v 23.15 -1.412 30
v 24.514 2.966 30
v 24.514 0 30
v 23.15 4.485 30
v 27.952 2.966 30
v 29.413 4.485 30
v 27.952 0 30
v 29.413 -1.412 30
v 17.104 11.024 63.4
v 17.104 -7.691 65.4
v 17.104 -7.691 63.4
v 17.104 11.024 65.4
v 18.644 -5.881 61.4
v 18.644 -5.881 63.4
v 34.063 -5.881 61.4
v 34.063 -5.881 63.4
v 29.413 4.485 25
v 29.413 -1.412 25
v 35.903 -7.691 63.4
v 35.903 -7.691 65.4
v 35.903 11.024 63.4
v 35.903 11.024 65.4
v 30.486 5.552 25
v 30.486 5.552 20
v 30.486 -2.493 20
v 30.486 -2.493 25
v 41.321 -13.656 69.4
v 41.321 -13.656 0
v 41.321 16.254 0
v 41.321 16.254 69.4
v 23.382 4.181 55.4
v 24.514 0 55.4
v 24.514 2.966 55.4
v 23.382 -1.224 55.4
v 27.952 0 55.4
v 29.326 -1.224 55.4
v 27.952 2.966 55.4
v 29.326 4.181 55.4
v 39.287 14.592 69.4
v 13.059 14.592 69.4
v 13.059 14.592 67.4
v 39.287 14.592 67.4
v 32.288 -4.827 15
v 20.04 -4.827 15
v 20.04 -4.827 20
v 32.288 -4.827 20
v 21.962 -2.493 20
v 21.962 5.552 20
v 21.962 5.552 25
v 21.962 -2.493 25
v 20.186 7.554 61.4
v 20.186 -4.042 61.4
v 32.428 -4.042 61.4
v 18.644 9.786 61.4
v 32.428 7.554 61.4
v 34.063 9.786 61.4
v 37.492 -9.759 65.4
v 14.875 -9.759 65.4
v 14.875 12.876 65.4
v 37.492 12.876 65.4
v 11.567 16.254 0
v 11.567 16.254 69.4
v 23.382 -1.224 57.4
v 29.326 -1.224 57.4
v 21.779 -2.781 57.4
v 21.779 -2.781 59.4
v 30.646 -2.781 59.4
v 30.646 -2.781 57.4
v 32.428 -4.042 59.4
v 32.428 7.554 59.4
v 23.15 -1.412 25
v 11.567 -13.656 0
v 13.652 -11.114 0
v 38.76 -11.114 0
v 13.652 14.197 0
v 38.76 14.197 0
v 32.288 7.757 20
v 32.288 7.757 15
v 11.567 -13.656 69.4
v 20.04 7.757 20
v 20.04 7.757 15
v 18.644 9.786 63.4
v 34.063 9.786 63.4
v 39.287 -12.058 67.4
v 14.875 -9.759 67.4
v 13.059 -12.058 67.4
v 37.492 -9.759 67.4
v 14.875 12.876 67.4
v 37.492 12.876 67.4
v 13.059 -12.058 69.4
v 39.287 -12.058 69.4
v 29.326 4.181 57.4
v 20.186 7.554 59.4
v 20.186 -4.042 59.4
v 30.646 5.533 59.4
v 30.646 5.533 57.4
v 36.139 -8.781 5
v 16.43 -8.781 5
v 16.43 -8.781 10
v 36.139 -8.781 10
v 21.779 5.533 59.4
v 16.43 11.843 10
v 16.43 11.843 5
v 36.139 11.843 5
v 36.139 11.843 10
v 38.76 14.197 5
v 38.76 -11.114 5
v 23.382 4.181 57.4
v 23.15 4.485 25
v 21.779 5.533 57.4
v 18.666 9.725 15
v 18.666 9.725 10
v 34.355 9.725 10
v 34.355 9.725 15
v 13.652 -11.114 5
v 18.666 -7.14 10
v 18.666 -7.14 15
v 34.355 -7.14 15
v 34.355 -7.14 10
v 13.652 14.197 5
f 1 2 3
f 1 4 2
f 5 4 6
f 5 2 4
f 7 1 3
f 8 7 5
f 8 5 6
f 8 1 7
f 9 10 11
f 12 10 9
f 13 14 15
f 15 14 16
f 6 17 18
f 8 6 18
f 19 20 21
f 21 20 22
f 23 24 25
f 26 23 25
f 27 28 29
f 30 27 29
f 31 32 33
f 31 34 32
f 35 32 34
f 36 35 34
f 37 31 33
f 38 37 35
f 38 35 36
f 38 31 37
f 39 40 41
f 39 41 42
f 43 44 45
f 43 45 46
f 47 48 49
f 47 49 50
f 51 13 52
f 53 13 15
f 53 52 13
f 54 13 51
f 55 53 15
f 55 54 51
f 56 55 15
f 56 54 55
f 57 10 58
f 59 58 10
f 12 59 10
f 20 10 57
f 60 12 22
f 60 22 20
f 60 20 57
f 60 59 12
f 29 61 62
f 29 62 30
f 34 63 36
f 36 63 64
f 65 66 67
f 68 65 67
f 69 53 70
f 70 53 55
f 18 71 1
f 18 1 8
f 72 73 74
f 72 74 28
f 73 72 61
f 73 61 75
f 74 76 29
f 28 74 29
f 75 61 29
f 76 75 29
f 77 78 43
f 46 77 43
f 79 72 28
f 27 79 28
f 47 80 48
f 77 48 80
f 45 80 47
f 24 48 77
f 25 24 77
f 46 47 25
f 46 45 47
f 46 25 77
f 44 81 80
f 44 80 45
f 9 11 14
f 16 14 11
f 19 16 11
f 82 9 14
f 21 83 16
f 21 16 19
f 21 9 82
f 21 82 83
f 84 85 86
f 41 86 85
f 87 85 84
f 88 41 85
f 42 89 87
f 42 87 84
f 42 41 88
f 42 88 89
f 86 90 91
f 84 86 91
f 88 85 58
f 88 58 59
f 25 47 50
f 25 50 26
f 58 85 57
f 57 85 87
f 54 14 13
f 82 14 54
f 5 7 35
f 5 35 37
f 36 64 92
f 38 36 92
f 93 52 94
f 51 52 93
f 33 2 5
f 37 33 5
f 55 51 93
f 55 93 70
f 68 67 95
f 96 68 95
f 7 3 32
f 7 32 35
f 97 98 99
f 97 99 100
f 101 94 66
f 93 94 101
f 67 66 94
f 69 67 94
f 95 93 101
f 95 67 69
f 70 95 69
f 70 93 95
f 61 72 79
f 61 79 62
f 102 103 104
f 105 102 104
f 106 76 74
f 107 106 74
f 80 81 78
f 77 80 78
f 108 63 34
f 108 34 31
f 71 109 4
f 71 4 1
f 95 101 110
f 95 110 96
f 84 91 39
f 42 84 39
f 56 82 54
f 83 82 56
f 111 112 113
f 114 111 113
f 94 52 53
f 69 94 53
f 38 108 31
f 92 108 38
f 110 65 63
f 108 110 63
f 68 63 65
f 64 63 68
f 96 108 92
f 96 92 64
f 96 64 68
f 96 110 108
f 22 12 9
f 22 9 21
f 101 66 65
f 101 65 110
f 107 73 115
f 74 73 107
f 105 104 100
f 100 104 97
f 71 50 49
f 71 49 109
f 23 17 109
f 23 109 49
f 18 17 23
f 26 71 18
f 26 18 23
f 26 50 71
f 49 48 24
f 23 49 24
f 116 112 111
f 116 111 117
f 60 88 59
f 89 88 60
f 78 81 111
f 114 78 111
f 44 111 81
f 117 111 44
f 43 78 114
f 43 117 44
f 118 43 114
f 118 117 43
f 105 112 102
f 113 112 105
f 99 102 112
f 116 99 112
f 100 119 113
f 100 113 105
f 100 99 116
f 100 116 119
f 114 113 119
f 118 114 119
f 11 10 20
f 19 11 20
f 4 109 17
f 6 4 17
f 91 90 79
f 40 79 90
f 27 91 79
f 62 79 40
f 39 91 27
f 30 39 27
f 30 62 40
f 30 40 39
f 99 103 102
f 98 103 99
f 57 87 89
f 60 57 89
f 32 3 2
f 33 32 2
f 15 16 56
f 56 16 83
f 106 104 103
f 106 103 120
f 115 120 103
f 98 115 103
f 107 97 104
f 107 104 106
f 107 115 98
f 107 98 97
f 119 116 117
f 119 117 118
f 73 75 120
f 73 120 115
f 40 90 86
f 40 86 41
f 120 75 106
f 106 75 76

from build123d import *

# Parameters (mm, degrees)
F0_W      = 29.753645
F0_H      = 29.910467
F1_DEPTH  = 69.4
F2_W      = 26.227938
F2_H      = 26.650196
F3_DEPTH  = 2
F4_W      = 22.616781
F4_H      = 22.63493
F5_DEPTH  = 2
F6_W      = 18.798804
F6_H      = 18.714747
F7_DEPTH  = 2
F8_W      = 15.419276
F8_H      = 15.666918
F9_DEPTH  = 2
F10_W     = 12.241865
F10_H     = 11.595491
F11_DEPTH = 2
F12_W     = 8.867356
F12_H     = 8.313611
F13_DEPTH = 2
F14_W     = 5.944216
F14_H     = 5.405146
F15_DEPTH = 2
F16_W     = 3.43767
F16_H     = 2.966377
F17_DEPTH = 55.401
F18_W     = 25.107885
F18_H     = 25.31029
F19_DEPTH = 5
F20_W     = 19.709587
F20_H     = 20.623714
F21_DEPTH = 5
F22_W     = 15.688963
F22_H     = 16.865403
F23_DEPTH = 5
F24_W     = 12.248309
F24_H     = 12.584658
F25_DEPTH = 5
F26_W     = 8.523883
F26_H     = 8.044946
F27_DEPTH = 5
F28_W     = 6.262533
F28_H     = 5.897496
F29_DEPTH = 5


with BuildPart() as f1:
    # F0 (on Top) → F1 (new body)
    with BuildSketch(Plane.XY):
        with Locations((26.444191, 1.299118)):
            Rectangle(F0_W, F0_H)
    extrude(amount=F1_DEPTH)

    # F2 (on face) → F3 (cut)
    with BuildSketch(Plane.XY.offset(69.4)):
        with Locations((26.172734, 1.267092)):
            Rectangle(F2_W, F2_H)
    extrude(amount=-F3_DEPTH, mode=Mode.SUBTRACT)

    # F4 (on face) → F5 (cut)
    with BuildSketch(Plane.XY.offset(67.4)):
        with Locations((26.183258, 1.558795)):
            Rectangle(F4_W, F4_H)
    extrude(amount=-F5_DEPTH, mode=Mode.SUBTRACT)

    # F6 (on face) → F7 (cut)
    with BuildSketch(Plane.XY.offset(65.4)):
        with Locations((26.503739, 1.66645)):
            Rectangle(F6_W, F6_H)
    extrude(amount=-F7_DEPTH, mode=Mode.SUBTRACT)

    # F8 (on face) → F9 (cut)
    with BuildSketch(Plane.XY.offset(63.4)):
        with Locations((26.353671, 1.952434)):
            Rectangle(F8_W, F8_H)
    extrude(amount=-F9_DEPTH, mode=Mode.SUBTRACT)

    # F10 (on face) → F11 (cut)
    with BuildSketch(Plane.XY.offset(61.4)):
        with Locations((26.306717, 1.756216)):
            Rectangle(F10_W, F10_H)
    extrude(amount=-F11_DEPTH, mode=Mode.SUBTRACT)

    # F12 (on face) → F13 (cut)
    with BuildSketch(Plane.XY.offset(59.4)):
        with Locations((26.212682, 1.37607)):
            Rectangle(F12_W, F12_H)
    extrude(amount=-F13_DEPTH, mode=Mode.SUBTRACT)

    # F14 (on face) → F15 (cut)
    with BuildSketch(Plane.XY.offset(57.4)):
        with Locations((26.353785, 1.47873)):
            Rectangle(F14_W, F14_H)
    extrude(amount=-F15_DEPTH, mode=Mode.SUBTRACT)

    # F16 (on face) → F17 (cut, through all)
    with BuildSketch(Plane.XY.offset(55.4)):
        with Locations((26.232888, 1.483189)):
            Rectangle(F16_W, F16_H)
    extrude(amount=-F17_DEPTH, mode=Mode.SUBTRACT)

    # F18 (on face) → F19 (cut)
    with BuildSketch(Plane(origin=(0, 0, 0), x_dir=(1, 0, 0), z_dir=(0, 0, -1))):
        with Locations((26.205565, -1.541603)):
            Rectangle(F18_W, F18_H)
    extrude(amount=-F19_DEPTH, mode=Mode.SUBTRACT)

    # F20 (on face) → F21 (cut)
    with BuildSketch(Plane(origin=(0, 0, 5), x_dir=(1, 0, 0), z_dir=(0, 0, -1))):
        with Locations((26.284554, -1.530935)):
            Rectangle(F20_W, F20_H)
    extrude(amount=-F21_DEPTH, mode=Mode.SUBTRACT)

    # F22 (on face) → F23 (cut)
    with BuildSketch(Plane(origin=(0, 0, 10), x_dir=(1, 0, 0), z_dir=(0, 0, -1))):
        with Locations((26.510216, -1.292301)):
            Rectangle(F22_W, F22_H)
    extrude(amount=-F23_DEPTH, mode=Mode.SUBTRACT)

    # F24 (on face) → F25 (cut)
    with BuildSketch(Plane(origin=(0, 0, 15), x_dir=(1, 0, 0), z_dir=(0, 0, -1))):
        with Locations((26.16421, -1.464862)):
            Rectangle(F24_W, F24_H)
    extrude(amount=-F25_DEPTH, mode=Mode.SUBTRACT)

    # F26 (on face) → F27 (cut)
    with BuildSketch(Plane(origin=(0, 0, 20), x_dir=(1, 0, 0), z_dir=(0, 0, -1))):
        with Locations((26.223567, -1.529857)):
            Rectangle(F26_W, F26_H)
    extrude(amount=-F27_DEPTH, mode=Mode.SUBTRACT)

    # F28 (on face) → F29 (cut)
    with BuildSketch(Plane(origin=(0, 0, 25), x_dir=(1, 0, 0), z_dir=(0, 0, -1))):
        with Locations((26.28174, -1.536325)):
            Rectangle(F28_W, F28_H)
    extrude(amount=-F29_DEPTH, mode=Mode.SUBTRACT)


solid = f1.part
